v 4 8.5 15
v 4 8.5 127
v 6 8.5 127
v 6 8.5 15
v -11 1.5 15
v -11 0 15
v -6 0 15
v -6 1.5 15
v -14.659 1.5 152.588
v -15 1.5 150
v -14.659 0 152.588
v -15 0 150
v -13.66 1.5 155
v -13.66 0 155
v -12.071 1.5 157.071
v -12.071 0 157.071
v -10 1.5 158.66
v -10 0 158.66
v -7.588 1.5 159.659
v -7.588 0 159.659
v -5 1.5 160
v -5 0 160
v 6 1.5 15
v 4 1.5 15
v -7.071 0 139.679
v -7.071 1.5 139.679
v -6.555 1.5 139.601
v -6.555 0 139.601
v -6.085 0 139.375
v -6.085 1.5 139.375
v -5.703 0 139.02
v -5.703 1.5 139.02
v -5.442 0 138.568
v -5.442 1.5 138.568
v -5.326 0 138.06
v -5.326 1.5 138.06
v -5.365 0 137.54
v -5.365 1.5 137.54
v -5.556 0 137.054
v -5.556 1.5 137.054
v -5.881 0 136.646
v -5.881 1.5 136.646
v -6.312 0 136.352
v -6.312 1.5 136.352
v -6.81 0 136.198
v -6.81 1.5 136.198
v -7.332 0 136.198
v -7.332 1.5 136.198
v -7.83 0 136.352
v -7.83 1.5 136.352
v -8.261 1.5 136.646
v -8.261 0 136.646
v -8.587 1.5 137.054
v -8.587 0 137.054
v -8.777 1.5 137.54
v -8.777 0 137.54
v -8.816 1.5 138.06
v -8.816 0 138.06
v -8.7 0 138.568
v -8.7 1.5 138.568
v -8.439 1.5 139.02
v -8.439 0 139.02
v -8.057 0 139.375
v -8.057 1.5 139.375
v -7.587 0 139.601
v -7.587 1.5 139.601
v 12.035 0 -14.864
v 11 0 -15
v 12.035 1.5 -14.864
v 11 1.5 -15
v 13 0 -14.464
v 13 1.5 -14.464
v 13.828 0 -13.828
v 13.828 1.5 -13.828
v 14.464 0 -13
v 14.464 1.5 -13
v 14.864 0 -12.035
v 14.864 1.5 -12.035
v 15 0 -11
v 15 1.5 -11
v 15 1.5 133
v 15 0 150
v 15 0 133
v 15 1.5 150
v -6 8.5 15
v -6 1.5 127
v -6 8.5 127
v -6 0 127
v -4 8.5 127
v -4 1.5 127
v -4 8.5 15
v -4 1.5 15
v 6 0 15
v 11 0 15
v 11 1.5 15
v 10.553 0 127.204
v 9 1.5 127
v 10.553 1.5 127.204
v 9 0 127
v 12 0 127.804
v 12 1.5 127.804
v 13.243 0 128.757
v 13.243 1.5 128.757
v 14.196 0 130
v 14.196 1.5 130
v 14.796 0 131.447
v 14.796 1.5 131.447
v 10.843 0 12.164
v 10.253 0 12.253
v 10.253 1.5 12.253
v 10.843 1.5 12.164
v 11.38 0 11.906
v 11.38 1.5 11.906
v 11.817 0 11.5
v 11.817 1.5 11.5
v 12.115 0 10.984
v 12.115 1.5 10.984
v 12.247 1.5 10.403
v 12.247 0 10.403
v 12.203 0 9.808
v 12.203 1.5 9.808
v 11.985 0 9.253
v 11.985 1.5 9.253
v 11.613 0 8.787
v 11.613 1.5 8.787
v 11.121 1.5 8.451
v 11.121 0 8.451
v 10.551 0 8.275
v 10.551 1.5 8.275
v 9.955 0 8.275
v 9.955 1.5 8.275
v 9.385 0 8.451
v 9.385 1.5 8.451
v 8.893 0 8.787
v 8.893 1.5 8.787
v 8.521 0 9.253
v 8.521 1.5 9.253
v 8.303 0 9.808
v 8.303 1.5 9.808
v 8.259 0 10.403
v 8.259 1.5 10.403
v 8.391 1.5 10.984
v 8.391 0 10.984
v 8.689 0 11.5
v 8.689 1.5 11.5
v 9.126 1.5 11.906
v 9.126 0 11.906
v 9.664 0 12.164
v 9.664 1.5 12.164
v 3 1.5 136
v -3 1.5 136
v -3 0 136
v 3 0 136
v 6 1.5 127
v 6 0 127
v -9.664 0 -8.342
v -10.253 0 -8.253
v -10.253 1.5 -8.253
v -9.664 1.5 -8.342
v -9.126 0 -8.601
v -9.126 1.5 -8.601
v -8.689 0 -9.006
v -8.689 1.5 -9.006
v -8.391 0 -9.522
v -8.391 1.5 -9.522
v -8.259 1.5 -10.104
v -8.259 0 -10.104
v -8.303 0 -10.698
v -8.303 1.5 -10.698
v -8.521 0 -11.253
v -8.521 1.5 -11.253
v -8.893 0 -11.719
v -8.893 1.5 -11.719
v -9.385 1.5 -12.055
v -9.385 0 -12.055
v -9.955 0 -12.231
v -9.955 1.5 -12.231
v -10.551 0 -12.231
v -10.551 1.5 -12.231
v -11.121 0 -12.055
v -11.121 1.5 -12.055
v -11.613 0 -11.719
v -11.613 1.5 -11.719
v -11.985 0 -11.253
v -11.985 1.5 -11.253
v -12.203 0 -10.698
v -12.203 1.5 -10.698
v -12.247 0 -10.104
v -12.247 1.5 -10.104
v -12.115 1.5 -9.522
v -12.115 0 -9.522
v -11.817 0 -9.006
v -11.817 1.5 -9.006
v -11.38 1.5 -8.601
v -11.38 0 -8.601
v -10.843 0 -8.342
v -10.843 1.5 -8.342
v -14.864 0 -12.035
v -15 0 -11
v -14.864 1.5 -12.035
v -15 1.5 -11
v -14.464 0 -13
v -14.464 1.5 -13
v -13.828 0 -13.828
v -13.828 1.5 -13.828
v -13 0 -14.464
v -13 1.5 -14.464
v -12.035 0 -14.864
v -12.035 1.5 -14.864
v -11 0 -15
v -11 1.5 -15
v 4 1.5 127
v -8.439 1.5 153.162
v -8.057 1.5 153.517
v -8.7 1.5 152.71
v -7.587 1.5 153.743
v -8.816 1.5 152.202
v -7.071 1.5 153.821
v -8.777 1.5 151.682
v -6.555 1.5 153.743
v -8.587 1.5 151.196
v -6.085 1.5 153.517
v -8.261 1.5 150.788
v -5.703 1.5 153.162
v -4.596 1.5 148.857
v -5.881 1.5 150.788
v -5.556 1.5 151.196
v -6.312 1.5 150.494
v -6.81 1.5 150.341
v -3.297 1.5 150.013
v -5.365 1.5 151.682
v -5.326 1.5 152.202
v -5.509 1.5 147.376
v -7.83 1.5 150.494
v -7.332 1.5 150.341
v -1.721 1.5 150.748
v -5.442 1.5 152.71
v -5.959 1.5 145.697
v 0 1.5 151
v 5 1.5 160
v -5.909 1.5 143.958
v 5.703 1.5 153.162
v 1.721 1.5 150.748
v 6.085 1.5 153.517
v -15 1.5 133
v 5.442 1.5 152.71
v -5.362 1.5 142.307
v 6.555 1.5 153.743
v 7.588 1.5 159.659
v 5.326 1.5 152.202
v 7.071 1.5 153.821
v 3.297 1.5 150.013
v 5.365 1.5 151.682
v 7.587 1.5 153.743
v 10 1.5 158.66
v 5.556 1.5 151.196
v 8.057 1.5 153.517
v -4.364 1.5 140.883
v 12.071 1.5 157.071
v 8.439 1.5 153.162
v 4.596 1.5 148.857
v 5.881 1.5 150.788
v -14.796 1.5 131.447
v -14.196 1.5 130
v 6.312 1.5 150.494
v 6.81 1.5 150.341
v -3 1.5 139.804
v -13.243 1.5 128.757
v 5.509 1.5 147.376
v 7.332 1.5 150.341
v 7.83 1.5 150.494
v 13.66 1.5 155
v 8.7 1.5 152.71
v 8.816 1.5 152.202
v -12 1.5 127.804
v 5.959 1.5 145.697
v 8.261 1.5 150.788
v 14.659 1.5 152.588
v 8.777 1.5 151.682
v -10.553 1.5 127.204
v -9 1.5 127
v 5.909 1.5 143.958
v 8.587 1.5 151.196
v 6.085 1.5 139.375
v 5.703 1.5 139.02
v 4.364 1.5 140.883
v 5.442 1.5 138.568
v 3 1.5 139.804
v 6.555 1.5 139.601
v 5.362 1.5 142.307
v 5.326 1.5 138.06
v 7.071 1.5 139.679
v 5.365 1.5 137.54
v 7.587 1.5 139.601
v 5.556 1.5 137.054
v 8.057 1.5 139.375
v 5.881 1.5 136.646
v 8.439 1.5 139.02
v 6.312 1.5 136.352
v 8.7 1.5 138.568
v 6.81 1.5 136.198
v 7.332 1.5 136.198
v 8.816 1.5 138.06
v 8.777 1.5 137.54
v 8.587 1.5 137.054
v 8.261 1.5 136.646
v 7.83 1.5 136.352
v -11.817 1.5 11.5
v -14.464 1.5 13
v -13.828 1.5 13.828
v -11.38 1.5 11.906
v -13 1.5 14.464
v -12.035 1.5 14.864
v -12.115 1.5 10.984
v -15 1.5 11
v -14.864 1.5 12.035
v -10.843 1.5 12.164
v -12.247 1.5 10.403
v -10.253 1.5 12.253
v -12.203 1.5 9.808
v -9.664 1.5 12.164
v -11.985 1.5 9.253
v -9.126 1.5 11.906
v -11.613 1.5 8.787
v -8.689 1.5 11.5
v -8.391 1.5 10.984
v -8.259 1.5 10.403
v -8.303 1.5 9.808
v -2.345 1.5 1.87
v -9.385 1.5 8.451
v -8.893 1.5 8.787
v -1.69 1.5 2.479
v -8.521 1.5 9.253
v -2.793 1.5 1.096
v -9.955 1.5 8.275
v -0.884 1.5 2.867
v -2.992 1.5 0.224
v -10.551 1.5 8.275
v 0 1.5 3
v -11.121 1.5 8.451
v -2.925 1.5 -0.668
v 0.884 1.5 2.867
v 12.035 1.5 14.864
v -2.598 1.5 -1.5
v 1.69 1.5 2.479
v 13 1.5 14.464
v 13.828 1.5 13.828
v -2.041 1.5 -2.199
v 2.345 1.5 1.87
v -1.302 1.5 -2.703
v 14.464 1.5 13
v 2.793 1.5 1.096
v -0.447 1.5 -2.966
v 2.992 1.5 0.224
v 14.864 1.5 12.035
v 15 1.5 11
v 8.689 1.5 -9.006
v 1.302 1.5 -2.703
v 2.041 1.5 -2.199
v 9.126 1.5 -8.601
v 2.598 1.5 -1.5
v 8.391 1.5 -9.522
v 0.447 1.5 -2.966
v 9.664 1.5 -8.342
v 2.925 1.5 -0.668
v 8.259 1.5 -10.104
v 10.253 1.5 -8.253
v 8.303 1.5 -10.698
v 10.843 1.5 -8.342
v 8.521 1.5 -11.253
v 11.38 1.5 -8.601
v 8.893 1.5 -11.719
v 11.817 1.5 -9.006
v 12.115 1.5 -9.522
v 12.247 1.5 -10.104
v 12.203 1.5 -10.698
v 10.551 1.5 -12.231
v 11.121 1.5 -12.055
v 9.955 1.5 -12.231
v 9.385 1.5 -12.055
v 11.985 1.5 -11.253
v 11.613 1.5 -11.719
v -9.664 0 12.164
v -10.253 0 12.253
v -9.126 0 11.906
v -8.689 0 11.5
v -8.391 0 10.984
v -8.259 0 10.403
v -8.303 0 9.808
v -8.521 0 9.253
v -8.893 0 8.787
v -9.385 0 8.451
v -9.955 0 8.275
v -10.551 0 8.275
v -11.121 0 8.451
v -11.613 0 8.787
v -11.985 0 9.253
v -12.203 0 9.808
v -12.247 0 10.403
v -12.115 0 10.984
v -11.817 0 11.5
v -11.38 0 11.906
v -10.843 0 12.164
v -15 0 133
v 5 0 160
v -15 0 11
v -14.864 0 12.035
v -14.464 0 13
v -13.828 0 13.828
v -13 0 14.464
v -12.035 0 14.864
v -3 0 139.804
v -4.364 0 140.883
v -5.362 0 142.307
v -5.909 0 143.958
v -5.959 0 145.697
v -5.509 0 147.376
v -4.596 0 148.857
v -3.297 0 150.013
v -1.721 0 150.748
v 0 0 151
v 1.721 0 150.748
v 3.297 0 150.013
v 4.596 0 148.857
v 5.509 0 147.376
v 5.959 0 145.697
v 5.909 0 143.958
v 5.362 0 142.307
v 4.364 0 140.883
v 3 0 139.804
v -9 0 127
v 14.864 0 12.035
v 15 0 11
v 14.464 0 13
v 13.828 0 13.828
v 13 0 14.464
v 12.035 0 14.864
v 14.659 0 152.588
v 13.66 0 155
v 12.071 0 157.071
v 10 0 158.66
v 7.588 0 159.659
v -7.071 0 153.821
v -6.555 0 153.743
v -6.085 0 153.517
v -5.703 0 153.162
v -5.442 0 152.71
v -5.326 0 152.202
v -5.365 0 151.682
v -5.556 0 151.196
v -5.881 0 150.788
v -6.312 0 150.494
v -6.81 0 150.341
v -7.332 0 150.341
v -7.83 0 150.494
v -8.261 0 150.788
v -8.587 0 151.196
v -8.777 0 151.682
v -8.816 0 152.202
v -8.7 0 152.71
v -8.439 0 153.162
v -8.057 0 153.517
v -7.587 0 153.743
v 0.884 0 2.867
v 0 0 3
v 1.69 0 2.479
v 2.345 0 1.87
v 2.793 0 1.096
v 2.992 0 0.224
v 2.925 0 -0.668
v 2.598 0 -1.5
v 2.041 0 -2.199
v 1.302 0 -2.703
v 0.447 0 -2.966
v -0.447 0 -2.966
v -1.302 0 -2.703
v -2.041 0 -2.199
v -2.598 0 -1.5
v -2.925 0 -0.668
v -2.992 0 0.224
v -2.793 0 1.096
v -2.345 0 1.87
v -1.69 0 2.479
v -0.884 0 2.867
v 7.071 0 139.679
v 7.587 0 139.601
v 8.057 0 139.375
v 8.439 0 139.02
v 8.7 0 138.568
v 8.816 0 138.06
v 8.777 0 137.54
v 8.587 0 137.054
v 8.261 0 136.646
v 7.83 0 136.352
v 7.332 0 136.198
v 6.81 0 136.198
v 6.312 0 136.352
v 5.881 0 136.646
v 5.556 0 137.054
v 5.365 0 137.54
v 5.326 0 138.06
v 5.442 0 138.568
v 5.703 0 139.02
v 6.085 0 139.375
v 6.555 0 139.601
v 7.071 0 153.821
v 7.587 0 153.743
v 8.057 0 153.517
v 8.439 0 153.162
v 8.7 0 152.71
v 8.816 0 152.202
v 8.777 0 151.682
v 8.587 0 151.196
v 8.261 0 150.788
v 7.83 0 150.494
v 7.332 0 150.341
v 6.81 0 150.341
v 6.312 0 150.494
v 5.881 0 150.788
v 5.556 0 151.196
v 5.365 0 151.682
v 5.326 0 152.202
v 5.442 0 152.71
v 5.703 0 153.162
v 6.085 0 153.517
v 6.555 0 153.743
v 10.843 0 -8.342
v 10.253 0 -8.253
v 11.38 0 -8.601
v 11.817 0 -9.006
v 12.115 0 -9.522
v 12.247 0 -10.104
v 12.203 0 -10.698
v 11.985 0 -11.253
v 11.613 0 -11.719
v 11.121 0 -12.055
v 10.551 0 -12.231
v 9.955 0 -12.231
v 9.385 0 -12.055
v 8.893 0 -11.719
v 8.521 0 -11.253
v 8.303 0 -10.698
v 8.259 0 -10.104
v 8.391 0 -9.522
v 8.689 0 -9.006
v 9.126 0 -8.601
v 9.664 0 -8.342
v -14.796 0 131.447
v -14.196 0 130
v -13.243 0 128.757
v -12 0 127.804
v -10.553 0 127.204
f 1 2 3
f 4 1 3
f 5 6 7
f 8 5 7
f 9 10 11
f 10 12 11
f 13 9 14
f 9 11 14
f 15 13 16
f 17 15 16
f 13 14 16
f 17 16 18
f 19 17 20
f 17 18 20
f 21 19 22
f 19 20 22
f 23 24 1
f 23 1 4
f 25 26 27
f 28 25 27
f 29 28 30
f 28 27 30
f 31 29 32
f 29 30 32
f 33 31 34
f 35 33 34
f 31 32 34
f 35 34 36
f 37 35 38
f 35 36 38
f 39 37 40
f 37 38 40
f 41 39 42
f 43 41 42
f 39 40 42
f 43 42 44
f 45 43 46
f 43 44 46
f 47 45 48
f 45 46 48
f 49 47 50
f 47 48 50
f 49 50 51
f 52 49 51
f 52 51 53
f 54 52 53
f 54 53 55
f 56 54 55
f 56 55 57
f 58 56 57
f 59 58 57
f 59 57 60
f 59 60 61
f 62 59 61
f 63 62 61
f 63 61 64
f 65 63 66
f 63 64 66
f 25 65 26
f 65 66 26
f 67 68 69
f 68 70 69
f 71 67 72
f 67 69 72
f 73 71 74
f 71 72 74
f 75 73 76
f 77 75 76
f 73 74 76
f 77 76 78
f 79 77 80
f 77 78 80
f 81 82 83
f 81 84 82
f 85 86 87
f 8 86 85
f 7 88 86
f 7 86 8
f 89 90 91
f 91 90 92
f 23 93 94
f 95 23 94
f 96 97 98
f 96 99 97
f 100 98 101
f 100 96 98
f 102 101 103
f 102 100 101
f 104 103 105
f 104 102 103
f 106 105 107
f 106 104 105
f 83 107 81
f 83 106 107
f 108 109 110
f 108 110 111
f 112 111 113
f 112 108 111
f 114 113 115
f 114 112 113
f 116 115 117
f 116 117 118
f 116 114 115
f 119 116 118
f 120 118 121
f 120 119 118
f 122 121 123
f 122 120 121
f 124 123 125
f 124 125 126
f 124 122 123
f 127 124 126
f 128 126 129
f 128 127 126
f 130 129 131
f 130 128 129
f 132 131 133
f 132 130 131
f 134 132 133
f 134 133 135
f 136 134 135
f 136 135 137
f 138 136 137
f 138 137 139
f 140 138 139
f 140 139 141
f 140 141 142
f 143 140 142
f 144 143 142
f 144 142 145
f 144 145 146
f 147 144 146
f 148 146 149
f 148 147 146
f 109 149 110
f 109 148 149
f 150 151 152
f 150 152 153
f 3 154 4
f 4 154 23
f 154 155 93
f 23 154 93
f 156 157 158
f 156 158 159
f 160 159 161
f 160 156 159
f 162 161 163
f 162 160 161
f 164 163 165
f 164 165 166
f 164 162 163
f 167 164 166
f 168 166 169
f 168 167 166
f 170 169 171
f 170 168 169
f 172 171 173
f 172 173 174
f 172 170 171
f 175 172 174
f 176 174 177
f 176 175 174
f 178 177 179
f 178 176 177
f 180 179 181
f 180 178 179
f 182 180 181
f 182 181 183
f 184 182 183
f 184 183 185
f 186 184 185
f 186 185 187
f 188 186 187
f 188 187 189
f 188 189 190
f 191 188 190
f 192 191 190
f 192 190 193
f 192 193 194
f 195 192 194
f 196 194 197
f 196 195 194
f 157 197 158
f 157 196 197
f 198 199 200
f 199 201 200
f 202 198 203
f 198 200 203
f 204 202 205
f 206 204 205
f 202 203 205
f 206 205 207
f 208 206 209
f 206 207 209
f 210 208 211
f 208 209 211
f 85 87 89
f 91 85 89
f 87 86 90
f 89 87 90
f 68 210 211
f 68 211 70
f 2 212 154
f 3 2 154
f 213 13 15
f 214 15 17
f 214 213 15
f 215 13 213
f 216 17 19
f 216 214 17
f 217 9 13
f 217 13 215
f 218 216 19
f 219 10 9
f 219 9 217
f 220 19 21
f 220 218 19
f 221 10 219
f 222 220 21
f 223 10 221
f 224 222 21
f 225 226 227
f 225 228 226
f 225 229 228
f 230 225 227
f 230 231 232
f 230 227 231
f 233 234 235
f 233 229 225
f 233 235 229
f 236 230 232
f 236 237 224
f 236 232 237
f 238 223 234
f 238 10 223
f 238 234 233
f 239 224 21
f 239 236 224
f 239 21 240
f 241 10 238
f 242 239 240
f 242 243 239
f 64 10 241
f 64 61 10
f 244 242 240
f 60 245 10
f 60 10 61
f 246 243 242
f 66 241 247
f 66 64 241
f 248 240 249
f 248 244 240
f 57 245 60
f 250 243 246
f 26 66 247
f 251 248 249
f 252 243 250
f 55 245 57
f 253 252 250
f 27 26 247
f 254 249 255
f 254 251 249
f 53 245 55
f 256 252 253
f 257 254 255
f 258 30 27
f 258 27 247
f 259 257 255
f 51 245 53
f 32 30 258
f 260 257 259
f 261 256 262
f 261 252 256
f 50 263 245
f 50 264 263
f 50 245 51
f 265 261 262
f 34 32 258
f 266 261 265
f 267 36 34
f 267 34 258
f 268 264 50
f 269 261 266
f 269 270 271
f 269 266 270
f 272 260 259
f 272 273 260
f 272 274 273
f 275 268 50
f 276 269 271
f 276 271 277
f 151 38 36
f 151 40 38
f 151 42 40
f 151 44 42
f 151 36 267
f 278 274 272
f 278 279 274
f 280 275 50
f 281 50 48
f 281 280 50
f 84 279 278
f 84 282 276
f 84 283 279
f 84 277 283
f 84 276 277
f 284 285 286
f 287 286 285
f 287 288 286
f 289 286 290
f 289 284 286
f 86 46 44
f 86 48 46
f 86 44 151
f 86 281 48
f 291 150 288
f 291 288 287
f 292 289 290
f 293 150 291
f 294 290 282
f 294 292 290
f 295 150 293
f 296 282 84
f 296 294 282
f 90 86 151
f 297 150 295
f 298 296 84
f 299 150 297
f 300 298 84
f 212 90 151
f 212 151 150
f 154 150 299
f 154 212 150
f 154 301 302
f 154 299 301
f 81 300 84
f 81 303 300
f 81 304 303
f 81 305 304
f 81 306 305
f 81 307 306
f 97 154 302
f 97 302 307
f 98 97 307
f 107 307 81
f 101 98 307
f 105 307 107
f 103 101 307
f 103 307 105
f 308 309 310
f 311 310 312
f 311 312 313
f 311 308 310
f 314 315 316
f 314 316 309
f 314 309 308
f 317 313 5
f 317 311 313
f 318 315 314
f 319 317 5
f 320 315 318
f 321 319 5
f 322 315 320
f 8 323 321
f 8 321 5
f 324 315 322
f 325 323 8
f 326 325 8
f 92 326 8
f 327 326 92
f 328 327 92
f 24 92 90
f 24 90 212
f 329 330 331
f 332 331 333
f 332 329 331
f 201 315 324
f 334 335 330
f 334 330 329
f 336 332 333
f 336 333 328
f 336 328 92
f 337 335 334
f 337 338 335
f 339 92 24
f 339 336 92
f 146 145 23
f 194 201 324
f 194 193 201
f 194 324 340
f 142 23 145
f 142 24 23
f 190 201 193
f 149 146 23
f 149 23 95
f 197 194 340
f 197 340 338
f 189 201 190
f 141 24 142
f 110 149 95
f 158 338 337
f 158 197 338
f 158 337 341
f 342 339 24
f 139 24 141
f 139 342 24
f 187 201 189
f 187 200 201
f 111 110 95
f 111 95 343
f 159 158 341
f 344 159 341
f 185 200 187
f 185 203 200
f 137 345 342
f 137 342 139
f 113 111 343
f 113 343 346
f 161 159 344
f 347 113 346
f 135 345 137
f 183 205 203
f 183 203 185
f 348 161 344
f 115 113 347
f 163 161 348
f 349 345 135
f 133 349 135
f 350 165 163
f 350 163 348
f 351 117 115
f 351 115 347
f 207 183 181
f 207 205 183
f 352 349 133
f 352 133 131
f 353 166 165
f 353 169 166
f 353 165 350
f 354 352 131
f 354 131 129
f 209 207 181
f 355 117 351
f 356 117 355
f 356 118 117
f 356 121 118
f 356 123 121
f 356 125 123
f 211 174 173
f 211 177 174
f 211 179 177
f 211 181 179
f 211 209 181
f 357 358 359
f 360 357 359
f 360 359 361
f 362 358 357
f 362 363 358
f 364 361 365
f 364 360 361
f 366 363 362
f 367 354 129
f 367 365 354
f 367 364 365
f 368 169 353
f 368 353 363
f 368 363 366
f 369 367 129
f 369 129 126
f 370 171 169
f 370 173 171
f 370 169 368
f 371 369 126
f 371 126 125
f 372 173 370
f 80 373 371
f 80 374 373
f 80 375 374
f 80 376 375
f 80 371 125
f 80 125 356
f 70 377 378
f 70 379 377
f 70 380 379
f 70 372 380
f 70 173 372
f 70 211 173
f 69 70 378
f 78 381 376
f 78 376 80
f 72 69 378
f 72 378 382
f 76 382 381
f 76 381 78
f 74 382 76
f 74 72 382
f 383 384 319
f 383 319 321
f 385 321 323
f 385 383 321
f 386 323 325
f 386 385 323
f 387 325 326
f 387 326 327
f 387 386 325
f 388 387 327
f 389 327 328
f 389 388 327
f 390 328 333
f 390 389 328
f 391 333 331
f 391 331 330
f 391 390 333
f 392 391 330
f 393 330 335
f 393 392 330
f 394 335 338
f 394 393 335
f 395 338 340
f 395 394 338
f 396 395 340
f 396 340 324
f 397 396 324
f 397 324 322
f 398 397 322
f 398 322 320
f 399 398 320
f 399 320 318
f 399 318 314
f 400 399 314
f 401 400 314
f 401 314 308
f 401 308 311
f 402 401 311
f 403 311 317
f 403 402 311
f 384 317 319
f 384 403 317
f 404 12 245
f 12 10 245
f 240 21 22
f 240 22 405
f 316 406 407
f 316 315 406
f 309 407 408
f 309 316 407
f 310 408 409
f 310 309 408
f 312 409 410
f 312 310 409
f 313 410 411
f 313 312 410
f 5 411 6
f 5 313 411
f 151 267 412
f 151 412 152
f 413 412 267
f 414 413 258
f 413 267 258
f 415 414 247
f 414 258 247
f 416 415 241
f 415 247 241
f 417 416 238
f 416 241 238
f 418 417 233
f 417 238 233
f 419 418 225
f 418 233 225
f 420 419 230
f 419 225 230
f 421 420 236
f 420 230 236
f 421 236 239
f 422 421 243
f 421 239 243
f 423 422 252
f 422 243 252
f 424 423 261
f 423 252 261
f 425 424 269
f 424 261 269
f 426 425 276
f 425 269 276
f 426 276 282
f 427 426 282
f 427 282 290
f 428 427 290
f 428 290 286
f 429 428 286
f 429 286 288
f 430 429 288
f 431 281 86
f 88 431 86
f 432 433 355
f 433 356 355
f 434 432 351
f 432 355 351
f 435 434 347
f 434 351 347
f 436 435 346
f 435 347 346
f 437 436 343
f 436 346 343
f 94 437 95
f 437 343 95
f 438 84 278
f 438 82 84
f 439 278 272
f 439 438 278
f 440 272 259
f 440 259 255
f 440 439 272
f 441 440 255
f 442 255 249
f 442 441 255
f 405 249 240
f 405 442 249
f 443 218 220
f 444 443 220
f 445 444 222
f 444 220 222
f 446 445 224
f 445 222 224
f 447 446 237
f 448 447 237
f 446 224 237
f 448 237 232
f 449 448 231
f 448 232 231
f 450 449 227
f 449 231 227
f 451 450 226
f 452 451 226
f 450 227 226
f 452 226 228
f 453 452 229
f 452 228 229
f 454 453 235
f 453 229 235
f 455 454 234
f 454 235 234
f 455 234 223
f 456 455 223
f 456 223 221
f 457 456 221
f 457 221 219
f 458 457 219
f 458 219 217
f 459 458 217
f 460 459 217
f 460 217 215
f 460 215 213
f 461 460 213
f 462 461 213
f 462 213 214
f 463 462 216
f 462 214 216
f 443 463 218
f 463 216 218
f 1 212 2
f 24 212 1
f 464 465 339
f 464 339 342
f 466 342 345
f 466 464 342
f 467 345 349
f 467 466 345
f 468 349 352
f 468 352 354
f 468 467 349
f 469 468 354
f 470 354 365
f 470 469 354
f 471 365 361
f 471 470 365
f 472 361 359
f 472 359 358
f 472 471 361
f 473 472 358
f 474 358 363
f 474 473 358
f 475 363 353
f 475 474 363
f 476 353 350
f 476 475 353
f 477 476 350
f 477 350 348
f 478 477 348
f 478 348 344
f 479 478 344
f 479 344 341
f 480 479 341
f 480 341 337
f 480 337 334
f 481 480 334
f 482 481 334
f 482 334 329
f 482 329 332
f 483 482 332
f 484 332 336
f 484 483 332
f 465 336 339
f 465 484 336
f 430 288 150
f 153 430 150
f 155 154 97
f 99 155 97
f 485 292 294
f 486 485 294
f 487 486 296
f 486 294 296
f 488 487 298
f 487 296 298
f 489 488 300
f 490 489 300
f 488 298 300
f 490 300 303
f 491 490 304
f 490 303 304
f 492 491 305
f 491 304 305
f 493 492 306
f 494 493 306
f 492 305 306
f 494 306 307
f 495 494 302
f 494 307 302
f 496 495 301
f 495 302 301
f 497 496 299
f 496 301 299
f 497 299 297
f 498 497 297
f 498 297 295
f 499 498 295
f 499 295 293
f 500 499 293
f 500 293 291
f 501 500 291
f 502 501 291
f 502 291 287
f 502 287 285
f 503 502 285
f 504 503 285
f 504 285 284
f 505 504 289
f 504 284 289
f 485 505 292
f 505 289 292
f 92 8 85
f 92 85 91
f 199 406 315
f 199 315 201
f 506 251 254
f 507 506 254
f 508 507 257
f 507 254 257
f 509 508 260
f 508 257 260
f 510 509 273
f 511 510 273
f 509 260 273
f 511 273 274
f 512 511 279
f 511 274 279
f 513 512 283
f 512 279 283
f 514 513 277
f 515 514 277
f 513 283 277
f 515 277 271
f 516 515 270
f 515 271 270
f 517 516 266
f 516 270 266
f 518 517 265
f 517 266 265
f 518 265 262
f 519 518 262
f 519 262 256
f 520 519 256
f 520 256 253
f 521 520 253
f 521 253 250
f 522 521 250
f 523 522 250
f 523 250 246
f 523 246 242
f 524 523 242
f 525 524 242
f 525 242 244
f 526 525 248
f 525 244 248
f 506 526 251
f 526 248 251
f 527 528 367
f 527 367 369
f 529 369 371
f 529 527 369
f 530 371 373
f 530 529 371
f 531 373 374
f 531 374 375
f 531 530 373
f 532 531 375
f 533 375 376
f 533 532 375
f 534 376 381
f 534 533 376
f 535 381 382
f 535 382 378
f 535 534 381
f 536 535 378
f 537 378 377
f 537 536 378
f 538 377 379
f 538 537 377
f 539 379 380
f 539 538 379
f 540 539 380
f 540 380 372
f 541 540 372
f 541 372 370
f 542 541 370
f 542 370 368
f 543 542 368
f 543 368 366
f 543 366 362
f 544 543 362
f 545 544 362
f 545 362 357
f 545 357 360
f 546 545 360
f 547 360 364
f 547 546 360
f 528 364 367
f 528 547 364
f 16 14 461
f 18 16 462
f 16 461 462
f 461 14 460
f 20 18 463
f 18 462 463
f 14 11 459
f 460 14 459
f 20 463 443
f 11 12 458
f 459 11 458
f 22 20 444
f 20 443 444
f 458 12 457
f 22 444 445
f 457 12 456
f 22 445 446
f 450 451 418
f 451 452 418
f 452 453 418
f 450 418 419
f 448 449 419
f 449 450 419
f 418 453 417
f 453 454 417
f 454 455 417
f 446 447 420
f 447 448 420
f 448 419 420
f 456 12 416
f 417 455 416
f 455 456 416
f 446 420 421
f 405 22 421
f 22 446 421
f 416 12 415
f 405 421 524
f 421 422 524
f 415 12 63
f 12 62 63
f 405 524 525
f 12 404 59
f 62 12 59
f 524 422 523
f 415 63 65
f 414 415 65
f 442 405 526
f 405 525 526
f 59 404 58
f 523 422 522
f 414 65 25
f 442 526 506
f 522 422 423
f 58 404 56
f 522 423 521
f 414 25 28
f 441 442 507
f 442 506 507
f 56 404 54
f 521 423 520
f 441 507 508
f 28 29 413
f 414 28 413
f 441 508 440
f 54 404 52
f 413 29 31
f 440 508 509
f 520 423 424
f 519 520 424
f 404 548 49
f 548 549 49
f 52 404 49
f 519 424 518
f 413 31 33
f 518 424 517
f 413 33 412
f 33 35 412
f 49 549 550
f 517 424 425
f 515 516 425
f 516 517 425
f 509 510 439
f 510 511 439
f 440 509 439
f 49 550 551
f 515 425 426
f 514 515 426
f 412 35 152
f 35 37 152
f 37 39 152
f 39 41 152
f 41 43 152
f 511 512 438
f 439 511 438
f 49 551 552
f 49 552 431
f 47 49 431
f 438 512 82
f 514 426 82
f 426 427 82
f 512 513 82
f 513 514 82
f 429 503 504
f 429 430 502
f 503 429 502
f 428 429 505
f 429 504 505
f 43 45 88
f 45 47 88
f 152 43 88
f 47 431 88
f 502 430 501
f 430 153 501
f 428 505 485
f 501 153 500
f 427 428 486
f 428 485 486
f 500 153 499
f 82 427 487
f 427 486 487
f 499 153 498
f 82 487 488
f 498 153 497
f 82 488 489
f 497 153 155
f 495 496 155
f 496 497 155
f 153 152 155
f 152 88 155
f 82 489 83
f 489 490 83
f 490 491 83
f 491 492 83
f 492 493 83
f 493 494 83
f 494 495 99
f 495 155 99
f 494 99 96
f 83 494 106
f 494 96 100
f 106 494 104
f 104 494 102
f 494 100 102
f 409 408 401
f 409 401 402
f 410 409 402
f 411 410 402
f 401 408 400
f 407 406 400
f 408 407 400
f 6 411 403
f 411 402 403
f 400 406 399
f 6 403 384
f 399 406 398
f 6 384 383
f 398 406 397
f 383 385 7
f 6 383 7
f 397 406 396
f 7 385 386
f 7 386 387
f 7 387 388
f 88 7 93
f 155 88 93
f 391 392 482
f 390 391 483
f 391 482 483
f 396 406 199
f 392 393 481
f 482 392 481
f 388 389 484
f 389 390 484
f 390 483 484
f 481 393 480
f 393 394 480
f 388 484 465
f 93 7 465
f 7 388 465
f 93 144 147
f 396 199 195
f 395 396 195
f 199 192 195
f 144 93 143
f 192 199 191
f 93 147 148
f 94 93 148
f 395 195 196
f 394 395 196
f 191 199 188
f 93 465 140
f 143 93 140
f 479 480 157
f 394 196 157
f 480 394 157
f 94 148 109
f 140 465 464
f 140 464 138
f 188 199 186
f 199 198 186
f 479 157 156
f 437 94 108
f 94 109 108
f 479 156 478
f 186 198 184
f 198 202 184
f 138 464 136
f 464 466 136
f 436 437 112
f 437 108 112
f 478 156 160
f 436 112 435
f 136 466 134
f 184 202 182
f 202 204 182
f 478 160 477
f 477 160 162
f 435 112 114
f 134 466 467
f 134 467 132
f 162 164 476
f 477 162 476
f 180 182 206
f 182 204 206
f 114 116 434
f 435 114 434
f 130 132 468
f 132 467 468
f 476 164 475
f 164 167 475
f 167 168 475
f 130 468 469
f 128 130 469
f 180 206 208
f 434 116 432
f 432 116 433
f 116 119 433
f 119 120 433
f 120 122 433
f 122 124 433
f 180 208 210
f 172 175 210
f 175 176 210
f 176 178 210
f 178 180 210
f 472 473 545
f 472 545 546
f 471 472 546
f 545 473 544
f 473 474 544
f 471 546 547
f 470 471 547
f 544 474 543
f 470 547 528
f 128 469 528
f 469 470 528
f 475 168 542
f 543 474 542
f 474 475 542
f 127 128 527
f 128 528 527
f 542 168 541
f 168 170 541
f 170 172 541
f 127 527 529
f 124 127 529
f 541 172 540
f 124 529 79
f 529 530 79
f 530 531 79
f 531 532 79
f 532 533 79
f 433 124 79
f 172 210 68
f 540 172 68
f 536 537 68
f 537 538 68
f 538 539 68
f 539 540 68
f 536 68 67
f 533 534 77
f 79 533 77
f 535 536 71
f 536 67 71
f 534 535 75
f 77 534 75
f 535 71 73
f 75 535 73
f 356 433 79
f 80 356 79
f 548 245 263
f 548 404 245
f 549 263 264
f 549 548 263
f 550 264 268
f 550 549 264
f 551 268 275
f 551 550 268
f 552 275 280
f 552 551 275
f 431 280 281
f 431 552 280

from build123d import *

# Parameters (mm, degrees)
SKETCH_2_W           = 30
SKETCH_2_H           = 31
SKETCH_2_R           = 3
EXTRUDE_1_DEPTH      = 1.5
SKETCH_4_W           = 30
SKETCH_4_H           = 137
SKETCH_4_R           = 1.75
SKETCH_4_R_2         = 6
EXTRUDE_2_DEPTH      = 1.5
SKETCH_5_W           = 6
SKETCH_5_H           = 6
CUT_EXTRUDE_1_DEPTH  = 161.708587201
FILLET_7_R           = 10
CUT_EXTRUDE_2_DEPTH  = 161.708587201
FILLET_10_R          = 6
EXTRUDE_START        = -1.5
SKETCH_7_W           = 30
SKETCH_7_H           = 30
SKETCH_7_R           = 3
SKETCH_7_R_2         = 2
EXTRUDE_3_DEPTH      = 1.5
FILLET_12_R          = 4
EXTRUDE_4_DEPTH      = 7
EXTRUDE_4_DEPTH_BACK = 1.5
SKETCH_8_W           = 2
SKETCH_8_H           = 112


with BuildPart() as part:
    # 草图2 → 凸台-拉伸1 (new body)
    with BuildSketch(Plane(origin=(0, 0, 0), x_dir=(1, 0, 0), z_dir=(0, 1, 0))):
        with Locations((0, -7.5)):
            Rectangle(SKETCH_2_W, SKETCH_2_H)
        with Locations(Location((0, 0, 0), (0, 0, 270))):
            Circle(SKETCH_2_R, mode=Mode.SUBTRACT)
    extrude(amount=EXTRUDE_1_DEPTH)

    # 草图4 → 凸台-拉伸2 (add)
    with BuildSketch(Plane(origin=(0, 1.5, 0), x_dir=(1, 0, 0), z_dir=(0, 1, 0))):
        with Locations((0, -91.5)):
            Rectangle(SKETCH_4_W, SKETCH_4_H)
        with Locations(Location((7.071067812, -137.928932188, 0), (0, 0, 270))):
            Circle(SKETCH_4_R, mode=Mode.SUBTRACT)
        with Locations(Location((-7.071067812, -152.071067812, 0), (0, 0, 270))):
            Circle(SKETCH_4_R, mode=Mode.SUBTRACT)
        with Locations(Location((-7.071067812, -137.928932188, 0), (0, 0, 270))):
            Circle(SKETCH_4_R, mode=Mode.SUBTRACT)
        with Locations(Location((7.071067812, -152.071067812, 0), (0, 0, 270))):
            Circle(SKETCH_4_R, mode=Mode.SUBTRACT)
        with Locations(Location((0, -145, 0), (0, 0, 270))):
            Circle(SKETCH_4_R_2, mode=Mode.SUBTRACT)
    extrude(amount=-EXTRUDE_2_DEPTH)

    # 草图5 → 切除-拉伸1 (cut, through all)
    with BuildSketch(Plane(origin=(0, 1.5, 0), x_dir=(1, 0, 0), z_dir=(0, 1, 0))):
        with Locations((0, -139)):
            Rectangle(SKETCH_5_W, SKETCH_5_H)
    extrude(amount=-CUT_EXTRUDE_1_DEPTH, mode=Mode.SUBTRACT)

    # 圆角7
    fillet_7_edges = [part.edges().sort_by_distance(p)[0] for p in [
        (-15, 0.75, 160),
        (15, 0.75, 160),
    ]]
    fillet(fillet_7_edges, radius=FILLET_7_R)

    # 草图6 → 切除-拉伸2 (cut, through all)
    with BuildSketch(Plane(origin=(0, 1.5, 0), x_dir=(1, 0, 0), z_dir=(0, 1, 0))):
        Polygon((-8, 8), (-8, -8), (-4, -8), (-4, -127), (-8, -127), (-15, -127), (-15, 8), align=None)
        Polygon((15, 8), (8, 8), (8, -8), (4, -8), (4, -127), (8, -127), (15, -127), align=None)
    extrude(amount=-CUT_EXTRUDE_2_DEPTH, mode=Mode.SUBTRACT)

    # 圆角10
    fillet_10_edges = [part.edges().sort_by_distance(p)[0] for p in [
        (-15, 0.75, 127),
        (15, 0.75, 127),
    ]]
    fillet(fillet_10_edges, radius=FILLET_10_R)

    # 草图7 → 凸台-拉伸3 (add)
    with BuildSketch(Plane(origin=(0, 1.5, 0), x_dir=(1, 0, 0), z_dir=(0, 1, 0)).offset(EXTRUDE_START)):
        Rectangle(SKETCH_7_W, SKETCH_7_H)
        with Locations(Location((0, 0, 0), (0, 0, 270))):
            Circle(SKETCH_7_R, mode=Mode.SUBTRACT)
        with Locations(Location((-10.253048327, 10.253048327, 0), (0, 0, 270))):
            Circle(SKETCH_7_R_2, mode=Mode.SUBTRACT)
        with Locations(Location((10.253048327, 10.253048327, 0), (0, 0, 270))):
            Circle(SKETCH_7_R_2, mode=Mode.SUBTRACT)
        with Locations(Location((-10.253048327, -10.253048327, 0), (0, 0, 270))):
            Circle(SKETCH_7_R_2, mode=Mode.SUBTRACT)
        with Locations(Location((10.253048327, -10.253048327, 0), (0, 0, 270))):
            Circle(SKETCH_7_R_2, mode=Mode.SUBTRACT)
    extrude(amount=EXTRUDE_3_DEPTH)

    # 圆角12
    fillet_12_edges = [part.edges().sort_by_distance(p)[0] for p in [
        (15, 0.75, 15),
        (15, 0.75, -15),
        (-15, 0.75, 15),
        (-15, 0.75, -15),
    ]]
    fillet(fillet_12_edges, radius=FILLET_12_R)

    # 草图8 → 凸台-拉伸4 (add, two sides: drawn at the far end of the back side and taken through both)
    with BuildSketch(Plane(origin=(0, 1.5, 0), x_dir=(1, 0, 0), z_dir=(0, 1, 0)).offset(-EXTRUDE_4_DEPTH_BACK)):
        with Locations((-5, -71)):
            Rectangle(SKETCH_8_W, SKETCH_8_H)
        with Locations((5, -71)):
            Rectangle(SKETCH_8_W, SKETCH_8_H)
    extrude(amount=EXTRUDE_4_DEPTH + EXTRUDE_4_DEPTH_BACK)


solid = part.part
